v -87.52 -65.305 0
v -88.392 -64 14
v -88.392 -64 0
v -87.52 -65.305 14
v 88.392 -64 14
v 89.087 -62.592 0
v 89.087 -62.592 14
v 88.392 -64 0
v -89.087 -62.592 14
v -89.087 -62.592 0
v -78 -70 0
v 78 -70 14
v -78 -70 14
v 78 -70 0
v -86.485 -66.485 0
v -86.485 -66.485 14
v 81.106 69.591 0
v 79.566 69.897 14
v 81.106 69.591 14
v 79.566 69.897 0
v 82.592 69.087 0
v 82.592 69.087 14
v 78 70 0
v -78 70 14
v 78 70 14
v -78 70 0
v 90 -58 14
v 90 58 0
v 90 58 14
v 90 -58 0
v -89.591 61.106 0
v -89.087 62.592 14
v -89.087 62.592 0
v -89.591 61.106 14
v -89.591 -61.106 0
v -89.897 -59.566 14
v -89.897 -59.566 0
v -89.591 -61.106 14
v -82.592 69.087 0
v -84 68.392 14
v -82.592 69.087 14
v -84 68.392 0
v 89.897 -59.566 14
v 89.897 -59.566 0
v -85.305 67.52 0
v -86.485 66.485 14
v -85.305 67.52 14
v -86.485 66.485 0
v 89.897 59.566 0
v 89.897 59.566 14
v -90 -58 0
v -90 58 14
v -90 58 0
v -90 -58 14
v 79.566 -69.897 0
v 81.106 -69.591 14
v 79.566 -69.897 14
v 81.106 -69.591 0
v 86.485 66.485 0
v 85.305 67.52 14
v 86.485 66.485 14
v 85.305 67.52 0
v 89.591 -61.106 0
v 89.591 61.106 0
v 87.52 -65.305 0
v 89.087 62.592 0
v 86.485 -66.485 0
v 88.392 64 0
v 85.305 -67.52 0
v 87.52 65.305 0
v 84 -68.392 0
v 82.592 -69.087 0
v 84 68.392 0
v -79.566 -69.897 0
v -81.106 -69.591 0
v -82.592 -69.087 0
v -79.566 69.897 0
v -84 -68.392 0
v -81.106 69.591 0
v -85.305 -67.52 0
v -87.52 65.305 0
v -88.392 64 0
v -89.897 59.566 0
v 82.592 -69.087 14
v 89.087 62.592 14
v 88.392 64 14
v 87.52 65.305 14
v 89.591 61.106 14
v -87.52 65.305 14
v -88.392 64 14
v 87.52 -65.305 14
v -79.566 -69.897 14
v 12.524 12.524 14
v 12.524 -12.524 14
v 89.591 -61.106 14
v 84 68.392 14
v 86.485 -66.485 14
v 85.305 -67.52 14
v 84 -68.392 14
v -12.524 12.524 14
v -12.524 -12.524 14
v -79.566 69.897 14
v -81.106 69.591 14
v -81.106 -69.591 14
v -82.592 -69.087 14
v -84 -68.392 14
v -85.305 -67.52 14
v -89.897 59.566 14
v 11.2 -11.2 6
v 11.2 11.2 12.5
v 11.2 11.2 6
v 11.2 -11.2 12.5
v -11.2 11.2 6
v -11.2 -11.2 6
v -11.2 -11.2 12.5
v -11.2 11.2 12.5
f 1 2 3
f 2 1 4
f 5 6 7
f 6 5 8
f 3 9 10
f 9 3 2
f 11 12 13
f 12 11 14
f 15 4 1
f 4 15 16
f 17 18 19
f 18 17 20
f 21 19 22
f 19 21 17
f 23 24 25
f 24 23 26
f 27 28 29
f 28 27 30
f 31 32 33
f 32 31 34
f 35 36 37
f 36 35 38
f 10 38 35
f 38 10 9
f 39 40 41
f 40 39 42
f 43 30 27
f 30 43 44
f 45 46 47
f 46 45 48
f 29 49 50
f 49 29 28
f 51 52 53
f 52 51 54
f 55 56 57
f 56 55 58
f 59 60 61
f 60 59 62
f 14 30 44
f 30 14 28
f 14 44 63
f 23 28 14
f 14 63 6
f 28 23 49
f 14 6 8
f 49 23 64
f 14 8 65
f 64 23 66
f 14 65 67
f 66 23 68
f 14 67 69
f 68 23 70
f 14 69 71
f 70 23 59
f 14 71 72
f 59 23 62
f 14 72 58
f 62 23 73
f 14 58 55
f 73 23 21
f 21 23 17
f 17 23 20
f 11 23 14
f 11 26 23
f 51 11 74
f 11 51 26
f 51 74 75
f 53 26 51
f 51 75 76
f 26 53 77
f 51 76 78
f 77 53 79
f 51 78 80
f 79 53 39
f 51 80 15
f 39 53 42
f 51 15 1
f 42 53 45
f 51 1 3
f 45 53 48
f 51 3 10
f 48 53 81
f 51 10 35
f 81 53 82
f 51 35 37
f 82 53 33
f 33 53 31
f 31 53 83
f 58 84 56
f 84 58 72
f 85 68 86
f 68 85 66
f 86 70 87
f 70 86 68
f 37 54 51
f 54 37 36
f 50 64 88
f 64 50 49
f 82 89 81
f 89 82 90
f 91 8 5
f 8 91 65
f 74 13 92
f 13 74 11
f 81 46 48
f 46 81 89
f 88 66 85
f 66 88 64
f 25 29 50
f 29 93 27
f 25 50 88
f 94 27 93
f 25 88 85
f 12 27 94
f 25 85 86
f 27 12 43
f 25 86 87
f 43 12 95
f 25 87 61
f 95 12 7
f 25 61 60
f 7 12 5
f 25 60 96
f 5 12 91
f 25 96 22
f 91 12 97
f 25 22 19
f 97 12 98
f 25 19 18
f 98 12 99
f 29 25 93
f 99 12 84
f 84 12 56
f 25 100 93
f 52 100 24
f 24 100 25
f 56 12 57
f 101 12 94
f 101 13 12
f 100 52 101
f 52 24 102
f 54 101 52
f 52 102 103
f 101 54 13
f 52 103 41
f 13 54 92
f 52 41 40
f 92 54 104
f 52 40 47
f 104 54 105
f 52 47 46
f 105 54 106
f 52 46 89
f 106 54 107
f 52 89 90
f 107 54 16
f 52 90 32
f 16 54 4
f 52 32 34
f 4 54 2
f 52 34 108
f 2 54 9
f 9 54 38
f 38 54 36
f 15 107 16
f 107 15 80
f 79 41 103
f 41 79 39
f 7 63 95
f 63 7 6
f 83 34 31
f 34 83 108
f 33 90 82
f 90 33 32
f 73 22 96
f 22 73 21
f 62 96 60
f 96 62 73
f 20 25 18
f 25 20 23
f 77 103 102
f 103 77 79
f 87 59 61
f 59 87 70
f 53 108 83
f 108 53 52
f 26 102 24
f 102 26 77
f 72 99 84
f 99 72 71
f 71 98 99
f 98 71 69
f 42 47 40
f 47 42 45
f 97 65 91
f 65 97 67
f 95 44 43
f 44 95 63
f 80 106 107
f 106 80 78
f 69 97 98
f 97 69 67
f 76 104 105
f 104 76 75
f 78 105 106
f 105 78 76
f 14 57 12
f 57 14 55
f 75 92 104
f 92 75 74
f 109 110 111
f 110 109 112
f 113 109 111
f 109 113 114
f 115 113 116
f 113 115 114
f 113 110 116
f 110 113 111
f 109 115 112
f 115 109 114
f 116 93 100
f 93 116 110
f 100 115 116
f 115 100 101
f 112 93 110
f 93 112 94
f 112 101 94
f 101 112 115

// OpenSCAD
/* Headphone stand in three parts: base, post, hanger.
   Print orientation: base flat, post tenon-down, hanger upside-down.
   Joints: square slip fit 22/22.4 (base-post) and 18/18.4 (post-hanger),
   0.2 mm/side clearance, square section locks rotation. */

part = "base"; // [base,post,hanger,assembly]

cadverify_only = "";
module instance(name, part, unit = 1) {
    echo(cadverify_instance = [name, part, unit]);
    if (cadverify_only == "" || cadverify_only == name) children();
}

// ---------- parameters (mm) ----------
base_L = 180; base_W = 140; base_H = 14; base_corner_r = 12;
base_sock_S = 22.4; base_sock_straight_top = 12.5; base_sock_floor = 6;
base_flare_top_S = 25.4;

post_bot_tenon_S = 22; post_bot_tenon_H = 8;
post_cone_H = 4; post_body_bot_S = 30; post_body_top_S = 24; post_body_H = 224;
post_top_tenon_S = 18; post_top_tenon_H = 8;

hanger_L = 110; hanger_W = 44; hanger_slab_H = 6; hanger_ridge_R = 22;
hanger_ridge_L = 90; hanger_sock_S = 18.4; hanger_sock_H = 8.1;
hanger_roof_base = 7.9; hanger_roof_H = 9.2;

post_Z = 6;
hanger_Z = 242; // post shoulder (236+6) -> hanger top 242+28 = 270

// ---------- modules (print orientation, min z = 0) ----------
module base() {
    difference() {
        linear_extrude(height = base_H)
            hull() {
                for (sx = [-1, 1], sy = [-1, 1])
                    translate([sx*(base_L/2-base_corner_r), sy*(base_W/2-base_corner_r)])
                        circle(r = base_corner_r, $fn = 48);
            }
        // straight socket
        translate([-base_sock_S/2, -base_sock_S/2, base_sock_floor])
            cube([base_sock_S, base_sock_S, base_H - base_sock_floor + 0.2]);
        // 45 deg entry flare
        translate([0, 0, base_sock_straight_top])
            linear_extrude(height = base_H - base_sock_straight_top + 0.2,
                           scale = base_flare_top_S/base_sock_S)
                square([base_sock_S, base_sock_S], center = true);
    }
}

module post() {
    // bottom tenon
    translate([-post_bot_tenon_S/2, -post_bot_tenon_S/2, 0])
        cube([post_bot_tenon_S, post_bot_tenon_S, post_bot_tenon_H]);
    // 45 deg collar cone 22 -> 30
    translate([0, 0, post_bot_tenon_H])
        linear_extrude(height = post_cone_H, scale = post_body_bot_S/post_bot_tenon_S)
            square([post_bot_tenon_S, post_bot_tenon_S], center = true);
    // tapered body 30 -> 24
    translate([0, 0, post_bot_tenon_H + post_cone_H])
        linear_extrude(height = post_body_H, scale = post_body_top_S/post_body_bot_S)
            square([post_body_bot_S, post_body_bot_S], center = true);
    // top tenon
    translate([-post_top_tenon_S/2, -post_top_tenon_S/2,
               post_bot_tenon_H + post_cone_H + post_body_H])
        cube([post_top_tenon_S, post_top_tenon_S, post_top_tenon_H]);
}

module hanger() {
    difference() {
        union() {
            // bottom slab with rounded plan corners
            linear_extrude(height = hanger_slab_H)
                hull() {
                    for (sx = [-1, 1], sy = [-1, 1])
                        translate([sx*(hanger_L/2-6), sy*(hanger_W/2-6)])
                            circle(r = 6, $fn = 32);
                }
            // rounded crown: top half of a horizontal cylinder along X
            intersection() {
                translate([0, 0, hanger_slab_H])
                    rotate([0, 90, 0])
                        cylinder(r = hanger_ridge_R, h = hanger_ridge_L,
                                 center = true, $fn = 128);
                translate([-hanger_ridge_L/2, -hanger_W/2, hanger_slab_H - 0.1])
                    cube([hanger_ridge_L, hanger_W, hanger_ridge_R + 0.1]);
            }
        }
        // straight socket from the bed face, top meets roof base exactly
        translate([-hanger_sock_S/2, -hanger_sock_S/2, -0.1])
            cube([hanger_sock_S, hanger_sock_S, hanger_roof_base + 0.1]);
        // 45 deg pyramid roof inside (no flat ceiling -> no supports)
        translate([0, 0, hanger_roof_base])
            linear_extrude(height = hanger_roof_H, scale = 0)
                square([hanger_sock_S, hanger_sock_S], center = true);
    }
}

module assembly() {
    instance("base_1", "base") translate([0, 0, 0]) base();
    instance("post_1", "post") translate([0, 0, post_Z]) post();
    instance("hanger_1", "hanger") translate([0, 0, hanger_Z]) hanger();
}

// ---------- spec ----------
if (part == "base") {
    echo(cadverify_spec = [
        ["bounds", [[-90, -70, 0], [90, 70, 14]]],
        ["bodies", 1],
        ["through_holes", 0],
        ["support_faces", [["base_bottom", "-z", 20000]]],
        ["overhangs_allowed", []],
        ["copies", 1],
        ["details", [
            ["base_plate", "material", [[-90, -70, 0], [90, 70, 6]], 0.9],
            ["socket_void", "void", [[-11.2, -11.2, 6], [11.2, 11.2, 12.5]], 0.9],
            ["mouth_flare", "hole", [0, 0, 20], [0, 0, -1], [[0, 28.2], [1.5, 25.3]]],
            ["floor", "thickness", [0, 0, -5], [0, 0, 1], 6]
        ]]
    ]);
} else if (part == "post") {
    echo(cadverify_spec = [
        ["bounds", [[-15, -15, 0], [15, 15, 244]]],
        ["bodies", 1],
        ["through_holes", 0],
        ["support_faces", [["tenon_bottom", "-z", 400]]],
        ["overhangs_allowed", []],
        ["copies", 1],
        ["details", [
            ["bottom_tenon", "material", [[-11, -11, 0], [11, 11, 8]], 0.9],
            ["collar", "material", [[-10, -10, 8], [10, 10, 12]], 0.9],
            ["body_inner", "material", [[-11, -11, 30], [11, 11, 100]], 0.9],
            ["top_tenon", "material", [[-9, -9, 236], [9, 9, 244]], 0.9],
            ["side_wall", "thickness", [-30, 0, 100], [1, 0, 0], 27.6]
        ]]
    ]);
} else if (part == "hanger") {
    echo(cadverify_spec = [
        ["bounds", [[-55, -22, 0], [55, 22, 28]]],
        ["bodies", 1],
        ["through_holes", 0],
        ["support_faces", [["hanger_bottom", "-z", 3500]]],
        ["overhangs_allowed", []],
        ["copies", 1],
        ["details", [
            ["wing_solid", "material", [[25, -20, 0], [50, 20, 6]], 0.9],
            ["ridge_solid", "material", [[25, -6, 10], [40, 6, 20]], 0.9],
            ["socket_void", "void", [[-9.2, -9.2, 0], [9.2, 9.2, 8]], 0.9],
            ["roof_void", "void", [[-9.2, -9.2, 8], [9.2, 9.2, 17.1]], 0.3],
            ["socket_entry", "hole", [0, 0, -5], [0, 0, 1], [[0, 20.8], [8, 20.8]]],
            ["crown_width", "thickness", [0, -30, 20], [0, 1, 0], 33.9],
            ["crown_floor", "thickness", [0, 0, 35], [0, 0, -1], 10.9],
            ["crown_round", "view", [[-20, -22, 20], [20, 22, 28]]]
        ]]
    ]);
} else if (part == "assembly") {
    echo(cadverify_spec = [
        ["bounds", [[-90, -70, 0], [90, 70, 270]]],
        ["support_faces", [["desk", "-z", 20000]]],
        ["allowed_interferences", []],
        ["motions", []],
        ["assembly_order", [
            [["base_1"], [0, 0, 0]],
            [["post_1"], [0, 0, -1]],
            [["hanger_1"], [0, 0, -1]]
        ]]
    ]);
}

// ---------- output ----------
if (part == "base") base();
else if (part == "post") post();
else if (part == "hanger") hanger();
else if (part == "assembly") assembly();
